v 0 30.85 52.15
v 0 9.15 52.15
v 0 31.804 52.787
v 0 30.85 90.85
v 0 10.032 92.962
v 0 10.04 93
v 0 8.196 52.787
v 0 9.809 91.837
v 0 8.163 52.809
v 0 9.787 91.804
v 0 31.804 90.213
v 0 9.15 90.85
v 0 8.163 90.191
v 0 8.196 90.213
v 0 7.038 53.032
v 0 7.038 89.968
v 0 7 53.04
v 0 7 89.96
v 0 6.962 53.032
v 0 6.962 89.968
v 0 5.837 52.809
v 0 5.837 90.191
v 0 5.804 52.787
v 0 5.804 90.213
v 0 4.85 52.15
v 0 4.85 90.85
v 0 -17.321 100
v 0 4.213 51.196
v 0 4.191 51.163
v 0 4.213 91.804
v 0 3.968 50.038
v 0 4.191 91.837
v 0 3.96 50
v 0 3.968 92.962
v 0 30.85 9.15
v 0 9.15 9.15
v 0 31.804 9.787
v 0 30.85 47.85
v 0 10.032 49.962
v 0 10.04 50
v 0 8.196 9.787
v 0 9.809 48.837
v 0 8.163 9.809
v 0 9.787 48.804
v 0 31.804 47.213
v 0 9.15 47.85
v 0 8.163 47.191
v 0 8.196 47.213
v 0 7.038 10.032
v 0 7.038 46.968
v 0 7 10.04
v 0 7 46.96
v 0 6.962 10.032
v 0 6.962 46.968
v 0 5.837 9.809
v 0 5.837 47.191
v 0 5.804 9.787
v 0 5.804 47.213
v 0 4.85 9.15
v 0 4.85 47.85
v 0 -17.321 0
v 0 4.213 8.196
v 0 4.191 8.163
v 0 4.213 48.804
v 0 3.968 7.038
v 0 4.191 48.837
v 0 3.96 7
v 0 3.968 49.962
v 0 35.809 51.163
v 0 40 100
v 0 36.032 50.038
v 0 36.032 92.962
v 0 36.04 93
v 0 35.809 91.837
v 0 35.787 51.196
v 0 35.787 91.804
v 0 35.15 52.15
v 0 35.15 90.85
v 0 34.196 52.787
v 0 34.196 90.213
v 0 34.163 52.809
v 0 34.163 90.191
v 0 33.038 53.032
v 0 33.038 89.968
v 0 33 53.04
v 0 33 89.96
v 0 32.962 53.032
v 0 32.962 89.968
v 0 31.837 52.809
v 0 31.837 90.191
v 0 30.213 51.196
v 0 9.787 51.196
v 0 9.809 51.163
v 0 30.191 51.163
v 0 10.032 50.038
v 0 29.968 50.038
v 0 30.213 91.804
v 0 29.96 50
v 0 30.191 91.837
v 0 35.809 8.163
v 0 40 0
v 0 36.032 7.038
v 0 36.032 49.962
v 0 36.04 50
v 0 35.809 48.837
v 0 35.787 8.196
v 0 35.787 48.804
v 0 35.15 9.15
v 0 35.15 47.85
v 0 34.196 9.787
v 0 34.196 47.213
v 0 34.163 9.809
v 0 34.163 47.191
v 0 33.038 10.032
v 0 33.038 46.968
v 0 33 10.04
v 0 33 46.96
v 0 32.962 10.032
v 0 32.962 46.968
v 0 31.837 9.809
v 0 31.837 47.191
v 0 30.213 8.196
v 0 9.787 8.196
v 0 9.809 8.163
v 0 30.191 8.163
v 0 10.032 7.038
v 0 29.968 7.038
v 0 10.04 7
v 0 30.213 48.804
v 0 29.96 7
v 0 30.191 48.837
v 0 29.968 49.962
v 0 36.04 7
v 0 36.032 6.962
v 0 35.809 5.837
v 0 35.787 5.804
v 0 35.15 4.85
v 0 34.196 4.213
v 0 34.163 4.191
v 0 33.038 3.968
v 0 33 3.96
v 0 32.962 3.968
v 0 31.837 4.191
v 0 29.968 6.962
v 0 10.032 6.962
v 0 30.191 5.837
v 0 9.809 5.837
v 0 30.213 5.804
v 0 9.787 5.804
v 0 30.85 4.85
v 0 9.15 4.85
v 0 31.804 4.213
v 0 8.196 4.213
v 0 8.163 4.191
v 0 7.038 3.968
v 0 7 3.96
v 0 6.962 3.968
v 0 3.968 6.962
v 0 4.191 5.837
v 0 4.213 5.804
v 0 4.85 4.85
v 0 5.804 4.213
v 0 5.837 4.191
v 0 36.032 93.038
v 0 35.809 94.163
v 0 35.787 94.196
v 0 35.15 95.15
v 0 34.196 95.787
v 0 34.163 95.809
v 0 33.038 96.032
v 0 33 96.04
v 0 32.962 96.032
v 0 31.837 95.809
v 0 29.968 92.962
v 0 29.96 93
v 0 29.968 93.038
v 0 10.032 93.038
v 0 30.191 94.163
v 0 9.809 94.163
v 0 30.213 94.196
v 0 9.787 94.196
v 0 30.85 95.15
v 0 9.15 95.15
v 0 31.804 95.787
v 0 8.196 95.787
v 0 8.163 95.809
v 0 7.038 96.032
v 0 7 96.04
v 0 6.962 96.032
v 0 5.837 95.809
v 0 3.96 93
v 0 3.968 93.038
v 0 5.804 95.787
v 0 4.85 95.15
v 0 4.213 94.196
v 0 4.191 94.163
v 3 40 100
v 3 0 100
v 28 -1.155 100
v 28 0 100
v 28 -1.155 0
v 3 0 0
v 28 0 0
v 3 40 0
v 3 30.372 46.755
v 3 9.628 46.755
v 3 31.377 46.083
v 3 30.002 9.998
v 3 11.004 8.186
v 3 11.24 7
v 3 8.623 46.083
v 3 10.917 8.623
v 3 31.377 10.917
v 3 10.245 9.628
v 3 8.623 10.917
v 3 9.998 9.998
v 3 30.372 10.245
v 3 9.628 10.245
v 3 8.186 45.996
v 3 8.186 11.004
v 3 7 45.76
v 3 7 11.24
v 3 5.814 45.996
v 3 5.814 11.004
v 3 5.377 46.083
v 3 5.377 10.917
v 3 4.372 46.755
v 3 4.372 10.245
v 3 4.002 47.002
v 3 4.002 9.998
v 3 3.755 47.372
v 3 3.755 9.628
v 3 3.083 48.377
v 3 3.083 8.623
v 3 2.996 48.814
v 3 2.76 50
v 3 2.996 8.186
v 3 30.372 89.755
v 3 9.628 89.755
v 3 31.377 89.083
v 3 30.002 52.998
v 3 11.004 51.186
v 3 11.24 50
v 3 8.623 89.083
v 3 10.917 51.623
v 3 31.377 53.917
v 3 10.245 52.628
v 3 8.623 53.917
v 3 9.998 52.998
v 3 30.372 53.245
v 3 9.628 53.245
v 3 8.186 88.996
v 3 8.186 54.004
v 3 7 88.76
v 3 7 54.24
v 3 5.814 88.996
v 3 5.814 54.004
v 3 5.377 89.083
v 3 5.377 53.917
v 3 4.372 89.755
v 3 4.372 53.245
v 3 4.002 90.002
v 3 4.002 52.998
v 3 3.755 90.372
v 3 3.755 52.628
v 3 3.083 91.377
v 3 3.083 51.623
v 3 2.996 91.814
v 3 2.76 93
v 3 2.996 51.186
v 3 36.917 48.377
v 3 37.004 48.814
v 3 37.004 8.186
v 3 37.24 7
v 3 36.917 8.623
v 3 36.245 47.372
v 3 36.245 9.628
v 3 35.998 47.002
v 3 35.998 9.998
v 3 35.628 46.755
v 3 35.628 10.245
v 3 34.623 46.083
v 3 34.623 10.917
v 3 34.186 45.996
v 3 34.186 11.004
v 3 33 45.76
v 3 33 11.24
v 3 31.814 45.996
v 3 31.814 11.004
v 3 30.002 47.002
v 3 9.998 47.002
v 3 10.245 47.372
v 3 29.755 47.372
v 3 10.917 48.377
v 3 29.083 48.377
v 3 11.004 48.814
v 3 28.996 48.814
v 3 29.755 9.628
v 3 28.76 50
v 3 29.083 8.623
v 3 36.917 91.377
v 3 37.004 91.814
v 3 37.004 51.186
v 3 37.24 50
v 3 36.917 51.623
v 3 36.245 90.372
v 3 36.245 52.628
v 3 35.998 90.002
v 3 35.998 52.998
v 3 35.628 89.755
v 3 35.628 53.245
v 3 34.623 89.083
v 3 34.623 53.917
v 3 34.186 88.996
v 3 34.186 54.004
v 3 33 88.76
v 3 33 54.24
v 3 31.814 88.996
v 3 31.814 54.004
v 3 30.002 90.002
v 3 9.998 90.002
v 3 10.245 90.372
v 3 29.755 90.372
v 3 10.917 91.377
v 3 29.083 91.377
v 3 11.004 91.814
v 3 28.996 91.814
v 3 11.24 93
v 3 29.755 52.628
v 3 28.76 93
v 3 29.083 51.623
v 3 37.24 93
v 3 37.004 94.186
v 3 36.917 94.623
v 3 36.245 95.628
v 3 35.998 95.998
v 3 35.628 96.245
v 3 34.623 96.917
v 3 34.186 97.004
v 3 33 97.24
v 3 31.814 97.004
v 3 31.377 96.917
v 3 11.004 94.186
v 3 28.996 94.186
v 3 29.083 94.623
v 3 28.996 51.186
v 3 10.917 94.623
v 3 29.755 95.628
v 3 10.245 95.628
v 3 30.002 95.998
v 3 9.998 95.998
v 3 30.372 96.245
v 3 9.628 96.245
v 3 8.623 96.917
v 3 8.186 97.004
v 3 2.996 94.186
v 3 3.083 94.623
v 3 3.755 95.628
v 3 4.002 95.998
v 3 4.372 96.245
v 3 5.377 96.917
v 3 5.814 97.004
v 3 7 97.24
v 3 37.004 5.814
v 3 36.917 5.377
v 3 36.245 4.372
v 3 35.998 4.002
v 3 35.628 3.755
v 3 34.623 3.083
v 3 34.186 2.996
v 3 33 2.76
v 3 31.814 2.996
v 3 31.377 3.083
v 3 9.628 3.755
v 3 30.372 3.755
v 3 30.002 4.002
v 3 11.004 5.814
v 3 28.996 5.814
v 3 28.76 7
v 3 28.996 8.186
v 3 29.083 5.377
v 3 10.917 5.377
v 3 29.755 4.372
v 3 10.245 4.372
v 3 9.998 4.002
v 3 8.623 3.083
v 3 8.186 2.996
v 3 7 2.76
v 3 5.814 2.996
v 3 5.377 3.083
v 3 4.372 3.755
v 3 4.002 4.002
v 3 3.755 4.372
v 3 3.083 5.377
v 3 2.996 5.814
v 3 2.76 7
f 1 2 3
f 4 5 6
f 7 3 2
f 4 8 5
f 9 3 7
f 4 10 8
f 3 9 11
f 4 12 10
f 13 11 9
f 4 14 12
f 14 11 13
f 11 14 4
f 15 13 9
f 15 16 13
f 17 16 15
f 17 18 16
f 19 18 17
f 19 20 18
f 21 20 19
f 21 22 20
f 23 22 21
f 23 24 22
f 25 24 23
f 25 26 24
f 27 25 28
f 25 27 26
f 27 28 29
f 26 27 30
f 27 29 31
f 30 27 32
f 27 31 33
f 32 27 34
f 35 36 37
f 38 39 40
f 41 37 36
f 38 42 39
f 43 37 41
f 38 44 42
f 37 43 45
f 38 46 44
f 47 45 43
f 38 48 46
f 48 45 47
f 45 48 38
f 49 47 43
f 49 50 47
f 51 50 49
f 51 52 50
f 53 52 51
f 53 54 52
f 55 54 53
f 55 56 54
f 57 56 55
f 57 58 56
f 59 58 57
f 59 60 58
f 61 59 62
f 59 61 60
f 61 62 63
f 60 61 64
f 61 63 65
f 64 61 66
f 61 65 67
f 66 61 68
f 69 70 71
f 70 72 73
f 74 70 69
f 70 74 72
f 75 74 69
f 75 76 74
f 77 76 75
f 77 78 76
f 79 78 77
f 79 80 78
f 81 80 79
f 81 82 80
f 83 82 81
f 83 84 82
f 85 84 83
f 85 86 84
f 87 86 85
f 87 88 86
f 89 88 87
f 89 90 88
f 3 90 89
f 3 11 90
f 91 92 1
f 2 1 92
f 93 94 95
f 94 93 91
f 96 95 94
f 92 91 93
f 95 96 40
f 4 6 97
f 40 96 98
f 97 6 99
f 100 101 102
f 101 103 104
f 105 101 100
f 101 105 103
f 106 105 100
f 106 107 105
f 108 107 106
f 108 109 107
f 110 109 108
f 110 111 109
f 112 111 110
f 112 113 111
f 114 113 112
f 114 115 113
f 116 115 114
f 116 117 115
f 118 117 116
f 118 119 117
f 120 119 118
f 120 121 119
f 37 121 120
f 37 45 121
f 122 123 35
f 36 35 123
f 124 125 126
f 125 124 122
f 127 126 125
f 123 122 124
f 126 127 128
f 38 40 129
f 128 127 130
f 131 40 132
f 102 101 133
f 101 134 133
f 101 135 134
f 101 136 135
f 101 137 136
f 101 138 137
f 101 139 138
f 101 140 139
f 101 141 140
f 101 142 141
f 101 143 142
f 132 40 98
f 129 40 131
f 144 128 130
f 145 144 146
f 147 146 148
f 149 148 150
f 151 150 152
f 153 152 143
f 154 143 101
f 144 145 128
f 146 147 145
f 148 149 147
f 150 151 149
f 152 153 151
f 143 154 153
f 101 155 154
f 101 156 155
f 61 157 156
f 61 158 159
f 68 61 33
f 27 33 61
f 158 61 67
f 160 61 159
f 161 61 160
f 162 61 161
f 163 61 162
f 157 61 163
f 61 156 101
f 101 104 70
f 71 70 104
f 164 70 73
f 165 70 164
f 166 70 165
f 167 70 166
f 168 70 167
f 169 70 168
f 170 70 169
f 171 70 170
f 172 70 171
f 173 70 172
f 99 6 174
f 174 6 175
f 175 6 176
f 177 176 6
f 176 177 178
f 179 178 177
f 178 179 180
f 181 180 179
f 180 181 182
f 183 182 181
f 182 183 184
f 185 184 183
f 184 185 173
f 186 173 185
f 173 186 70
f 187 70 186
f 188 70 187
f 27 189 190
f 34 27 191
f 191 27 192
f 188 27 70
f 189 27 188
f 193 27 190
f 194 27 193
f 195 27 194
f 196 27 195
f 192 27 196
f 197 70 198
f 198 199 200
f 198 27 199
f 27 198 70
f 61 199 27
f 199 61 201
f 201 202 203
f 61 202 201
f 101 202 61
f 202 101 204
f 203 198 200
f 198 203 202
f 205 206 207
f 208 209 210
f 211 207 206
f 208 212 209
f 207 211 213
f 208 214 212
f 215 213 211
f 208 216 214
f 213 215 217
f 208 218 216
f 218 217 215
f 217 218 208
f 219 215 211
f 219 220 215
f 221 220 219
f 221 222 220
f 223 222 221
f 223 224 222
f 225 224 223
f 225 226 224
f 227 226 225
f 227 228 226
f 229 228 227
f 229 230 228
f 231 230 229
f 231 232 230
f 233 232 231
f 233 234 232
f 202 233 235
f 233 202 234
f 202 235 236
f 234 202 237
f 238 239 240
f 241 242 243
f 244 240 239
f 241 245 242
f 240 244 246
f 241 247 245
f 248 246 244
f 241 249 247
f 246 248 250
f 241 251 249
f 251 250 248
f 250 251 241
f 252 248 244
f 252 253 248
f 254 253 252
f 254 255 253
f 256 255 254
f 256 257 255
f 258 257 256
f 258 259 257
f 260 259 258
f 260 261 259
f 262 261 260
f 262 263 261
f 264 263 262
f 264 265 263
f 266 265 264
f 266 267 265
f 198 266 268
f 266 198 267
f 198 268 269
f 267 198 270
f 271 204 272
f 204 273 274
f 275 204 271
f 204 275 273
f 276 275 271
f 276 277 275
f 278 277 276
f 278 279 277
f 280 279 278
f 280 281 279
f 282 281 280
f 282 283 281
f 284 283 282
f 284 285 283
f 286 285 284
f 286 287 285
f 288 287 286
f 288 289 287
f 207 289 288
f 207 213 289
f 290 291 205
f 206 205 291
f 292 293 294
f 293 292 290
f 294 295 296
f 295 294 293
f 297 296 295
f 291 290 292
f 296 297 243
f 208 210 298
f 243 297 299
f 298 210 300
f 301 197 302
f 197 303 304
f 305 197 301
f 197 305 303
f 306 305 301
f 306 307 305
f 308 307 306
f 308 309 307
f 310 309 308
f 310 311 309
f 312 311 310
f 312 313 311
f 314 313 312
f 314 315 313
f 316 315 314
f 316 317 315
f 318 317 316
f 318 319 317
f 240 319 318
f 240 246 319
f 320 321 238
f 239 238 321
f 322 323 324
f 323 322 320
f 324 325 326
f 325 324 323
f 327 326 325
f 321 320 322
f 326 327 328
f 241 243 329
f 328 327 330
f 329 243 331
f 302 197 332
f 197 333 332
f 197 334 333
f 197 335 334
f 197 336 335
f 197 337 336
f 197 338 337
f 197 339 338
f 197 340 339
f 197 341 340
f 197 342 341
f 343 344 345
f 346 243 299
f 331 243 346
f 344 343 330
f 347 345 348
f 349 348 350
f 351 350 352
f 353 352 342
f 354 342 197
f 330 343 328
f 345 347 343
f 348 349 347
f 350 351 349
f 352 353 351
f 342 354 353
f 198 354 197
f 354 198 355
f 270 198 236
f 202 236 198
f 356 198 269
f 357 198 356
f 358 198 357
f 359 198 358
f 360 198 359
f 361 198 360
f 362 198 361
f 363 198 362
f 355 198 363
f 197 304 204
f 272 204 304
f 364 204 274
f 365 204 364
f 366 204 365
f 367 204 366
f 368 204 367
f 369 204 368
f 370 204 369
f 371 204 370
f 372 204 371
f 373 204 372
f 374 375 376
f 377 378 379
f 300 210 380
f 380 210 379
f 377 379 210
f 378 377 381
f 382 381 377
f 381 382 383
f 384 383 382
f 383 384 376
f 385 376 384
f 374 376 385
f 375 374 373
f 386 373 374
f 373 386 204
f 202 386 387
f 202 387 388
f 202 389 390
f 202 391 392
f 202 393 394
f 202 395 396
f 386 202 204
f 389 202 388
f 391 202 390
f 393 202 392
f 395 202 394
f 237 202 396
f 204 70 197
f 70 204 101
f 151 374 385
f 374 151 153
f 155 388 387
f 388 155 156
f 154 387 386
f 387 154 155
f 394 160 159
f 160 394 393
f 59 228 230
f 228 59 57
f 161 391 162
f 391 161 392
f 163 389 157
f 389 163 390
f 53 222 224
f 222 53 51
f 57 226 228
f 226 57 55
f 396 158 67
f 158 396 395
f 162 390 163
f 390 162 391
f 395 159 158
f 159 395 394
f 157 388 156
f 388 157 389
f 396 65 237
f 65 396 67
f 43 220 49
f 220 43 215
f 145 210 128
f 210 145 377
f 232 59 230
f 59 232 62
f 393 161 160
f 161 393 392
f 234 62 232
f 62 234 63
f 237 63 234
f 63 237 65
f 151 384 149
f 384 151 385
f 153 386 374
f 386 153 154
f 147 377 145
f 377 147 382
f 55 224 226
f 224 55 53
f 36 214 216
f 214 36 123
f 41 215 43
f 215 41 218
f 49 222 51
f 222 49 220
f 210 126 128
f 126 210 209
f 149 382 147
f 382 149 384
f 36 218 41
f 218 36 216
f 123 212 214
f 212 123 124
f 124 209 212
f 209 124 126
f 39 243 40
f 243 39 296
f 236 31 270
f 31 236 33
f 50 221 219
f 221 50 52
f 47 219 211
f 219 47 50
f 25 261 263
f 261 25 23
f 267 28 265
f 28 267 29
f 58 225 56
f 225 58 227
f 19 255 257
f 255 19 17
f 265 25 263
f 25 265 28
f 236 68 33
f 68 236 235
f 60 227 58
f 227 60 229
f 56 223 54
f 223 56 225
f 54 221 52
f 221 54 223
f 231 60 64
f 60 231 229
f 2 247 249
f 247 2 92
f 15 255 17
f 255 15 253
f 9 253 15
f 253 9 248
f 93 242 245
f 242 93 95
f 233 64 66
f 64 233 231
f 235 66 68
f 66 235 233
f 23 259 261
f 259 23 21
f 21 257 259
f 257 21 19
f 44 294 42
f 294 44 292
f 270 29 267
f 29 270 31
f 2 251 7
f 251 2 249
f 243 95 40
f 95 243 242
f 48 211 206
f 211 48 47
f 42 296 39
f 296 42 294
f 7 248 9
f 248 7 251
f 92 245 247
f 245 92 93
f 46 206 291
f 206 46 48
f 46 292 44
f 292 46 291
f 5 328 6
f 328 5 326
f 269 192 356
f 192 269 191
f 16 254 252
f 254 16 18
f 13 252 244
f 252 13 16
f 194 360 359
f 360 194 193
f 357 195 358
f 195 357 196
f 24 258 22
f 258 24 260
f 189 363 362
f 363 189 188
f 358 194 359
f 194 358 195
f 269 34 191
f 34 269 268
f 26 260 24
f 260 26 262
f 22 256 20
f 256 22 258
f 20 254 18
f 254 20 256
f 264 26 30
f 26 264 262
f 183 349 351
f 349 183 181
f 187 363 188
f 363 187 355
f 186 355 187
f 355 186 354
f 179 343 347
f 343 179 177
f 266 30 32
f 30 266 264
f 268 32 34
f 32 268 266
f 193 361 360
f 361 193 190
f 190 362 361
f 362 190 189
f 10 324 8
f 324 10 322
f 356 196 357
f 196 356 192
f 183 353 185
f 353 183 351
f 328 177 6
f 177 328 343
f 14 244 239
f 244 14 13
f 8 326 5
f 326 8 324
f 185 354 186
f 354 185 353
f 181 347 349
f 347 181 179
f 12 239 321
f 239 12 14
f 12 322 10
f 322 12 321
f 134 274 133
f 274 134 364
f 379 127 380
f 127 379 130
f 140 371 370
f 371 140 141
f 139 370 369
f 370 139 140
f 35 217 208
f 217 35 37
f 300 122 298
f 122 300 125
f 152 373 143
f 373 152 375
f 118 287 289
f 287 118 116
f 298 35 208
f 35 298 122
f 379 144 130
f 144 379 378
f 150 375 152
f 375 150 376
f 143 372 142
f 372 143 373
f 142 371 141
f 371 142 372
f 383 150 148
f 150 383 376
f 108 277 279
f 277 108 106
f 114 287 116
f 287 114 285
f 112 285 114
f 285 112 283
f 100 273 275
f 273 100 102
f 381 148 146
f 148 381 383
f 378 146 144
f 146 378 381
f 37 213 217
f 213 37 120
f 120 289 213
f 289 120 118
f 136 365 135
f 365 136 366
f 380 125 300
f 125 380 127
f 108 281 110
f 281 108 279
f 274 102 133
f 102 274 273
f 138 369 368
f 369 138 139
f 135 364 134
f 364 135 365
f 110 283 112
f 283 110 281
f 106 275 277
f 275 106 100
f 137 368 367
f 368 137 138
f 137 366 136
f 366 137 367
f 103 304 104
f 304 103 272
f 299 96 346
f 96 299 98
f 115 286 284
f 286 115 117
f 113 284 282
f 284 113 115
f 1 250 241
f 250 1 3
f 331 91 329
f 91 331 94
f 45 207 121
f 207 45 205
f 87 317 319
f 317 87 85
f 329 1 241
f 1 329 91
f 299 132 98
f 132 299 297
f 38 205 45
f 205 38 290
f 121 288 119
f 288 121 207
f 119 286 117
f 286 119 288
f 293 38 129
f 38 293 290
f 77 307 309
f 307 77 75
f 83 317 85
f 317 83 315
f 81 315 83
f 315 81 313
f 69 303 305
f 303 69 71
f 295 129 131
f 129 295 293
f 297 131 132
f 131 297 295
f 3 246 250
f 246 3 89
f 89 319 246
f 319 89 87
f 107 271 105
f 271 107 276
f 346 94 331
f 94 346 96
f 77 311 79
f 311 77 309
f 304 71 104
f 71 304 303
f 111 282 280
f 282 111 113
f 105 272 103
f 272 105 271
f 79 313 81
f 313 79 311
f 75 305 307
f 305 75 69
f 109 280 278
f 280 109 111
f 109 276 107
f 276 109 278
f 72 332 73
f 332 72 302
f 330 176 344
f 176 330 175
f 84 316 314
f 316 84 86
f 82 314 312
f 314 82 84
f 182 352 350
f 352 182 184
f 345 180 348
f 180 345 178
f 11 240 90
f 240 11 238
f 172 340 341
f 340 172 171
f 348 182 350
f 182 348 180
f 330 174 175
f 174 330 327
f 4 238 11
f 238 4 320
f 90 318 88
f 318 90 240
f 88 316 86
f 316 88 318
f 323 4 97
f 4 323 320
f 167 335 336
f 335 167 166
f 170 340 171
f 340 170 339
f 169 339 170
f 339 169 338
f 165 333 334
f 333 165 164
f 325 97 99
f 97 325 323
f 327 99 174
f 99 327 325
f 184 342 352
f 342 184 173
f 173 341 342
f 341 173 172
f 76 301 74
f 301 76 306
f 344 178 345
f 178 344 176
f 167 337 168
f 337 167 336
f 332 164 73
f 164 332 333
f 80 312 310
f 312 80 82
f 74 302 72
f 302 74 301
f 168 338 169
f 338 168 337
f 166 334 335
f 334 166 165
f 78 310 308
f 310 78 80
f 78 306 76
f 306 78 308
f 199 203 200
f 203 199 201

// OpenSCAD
// Model purpose: Printable door stop intended to hold a door open and prevent impacts against walls or furniture in a household/office setting.
// Geometry combines a stable base with screw holes and angled contact surfaces for secure placement and repeated daily use.
difference() {
  union() {
    cube([3, 40, 100]);
    difference() {
    translate([10, 0, 0])
      cylinder(100, 20, 20, $fn=3);
      translate([-0.1, 0, -0.1]) cube([100, 100, 110]);
    }
  }
  translate([-0.1, 7, 7]) rotate([0, 90, 0]) cylinder(5, 3, 5);
  translate([-0.1, 7, 50]) rotate([0, 90, 0]) cylinder(5, 3, 5);
  translate([-0.1, 7, 93]) rotate([0, 90, 0]) cylinder(5, 3, 5);

  translate([-0.1, 33, 7]) rotate([0, 90, 0]) cylinder(5, 3, 5);
  translate([-0.1, 33, 50]) rotate([0, 90, 0]) cylinder(5, 3, 5);
  translate([-0.1, 33, 93]) rotate([0, 90, 0]) cylinder(5, 3, 5);

  translate([28, -11, -1]) cube([3, 42, 102]);
}
